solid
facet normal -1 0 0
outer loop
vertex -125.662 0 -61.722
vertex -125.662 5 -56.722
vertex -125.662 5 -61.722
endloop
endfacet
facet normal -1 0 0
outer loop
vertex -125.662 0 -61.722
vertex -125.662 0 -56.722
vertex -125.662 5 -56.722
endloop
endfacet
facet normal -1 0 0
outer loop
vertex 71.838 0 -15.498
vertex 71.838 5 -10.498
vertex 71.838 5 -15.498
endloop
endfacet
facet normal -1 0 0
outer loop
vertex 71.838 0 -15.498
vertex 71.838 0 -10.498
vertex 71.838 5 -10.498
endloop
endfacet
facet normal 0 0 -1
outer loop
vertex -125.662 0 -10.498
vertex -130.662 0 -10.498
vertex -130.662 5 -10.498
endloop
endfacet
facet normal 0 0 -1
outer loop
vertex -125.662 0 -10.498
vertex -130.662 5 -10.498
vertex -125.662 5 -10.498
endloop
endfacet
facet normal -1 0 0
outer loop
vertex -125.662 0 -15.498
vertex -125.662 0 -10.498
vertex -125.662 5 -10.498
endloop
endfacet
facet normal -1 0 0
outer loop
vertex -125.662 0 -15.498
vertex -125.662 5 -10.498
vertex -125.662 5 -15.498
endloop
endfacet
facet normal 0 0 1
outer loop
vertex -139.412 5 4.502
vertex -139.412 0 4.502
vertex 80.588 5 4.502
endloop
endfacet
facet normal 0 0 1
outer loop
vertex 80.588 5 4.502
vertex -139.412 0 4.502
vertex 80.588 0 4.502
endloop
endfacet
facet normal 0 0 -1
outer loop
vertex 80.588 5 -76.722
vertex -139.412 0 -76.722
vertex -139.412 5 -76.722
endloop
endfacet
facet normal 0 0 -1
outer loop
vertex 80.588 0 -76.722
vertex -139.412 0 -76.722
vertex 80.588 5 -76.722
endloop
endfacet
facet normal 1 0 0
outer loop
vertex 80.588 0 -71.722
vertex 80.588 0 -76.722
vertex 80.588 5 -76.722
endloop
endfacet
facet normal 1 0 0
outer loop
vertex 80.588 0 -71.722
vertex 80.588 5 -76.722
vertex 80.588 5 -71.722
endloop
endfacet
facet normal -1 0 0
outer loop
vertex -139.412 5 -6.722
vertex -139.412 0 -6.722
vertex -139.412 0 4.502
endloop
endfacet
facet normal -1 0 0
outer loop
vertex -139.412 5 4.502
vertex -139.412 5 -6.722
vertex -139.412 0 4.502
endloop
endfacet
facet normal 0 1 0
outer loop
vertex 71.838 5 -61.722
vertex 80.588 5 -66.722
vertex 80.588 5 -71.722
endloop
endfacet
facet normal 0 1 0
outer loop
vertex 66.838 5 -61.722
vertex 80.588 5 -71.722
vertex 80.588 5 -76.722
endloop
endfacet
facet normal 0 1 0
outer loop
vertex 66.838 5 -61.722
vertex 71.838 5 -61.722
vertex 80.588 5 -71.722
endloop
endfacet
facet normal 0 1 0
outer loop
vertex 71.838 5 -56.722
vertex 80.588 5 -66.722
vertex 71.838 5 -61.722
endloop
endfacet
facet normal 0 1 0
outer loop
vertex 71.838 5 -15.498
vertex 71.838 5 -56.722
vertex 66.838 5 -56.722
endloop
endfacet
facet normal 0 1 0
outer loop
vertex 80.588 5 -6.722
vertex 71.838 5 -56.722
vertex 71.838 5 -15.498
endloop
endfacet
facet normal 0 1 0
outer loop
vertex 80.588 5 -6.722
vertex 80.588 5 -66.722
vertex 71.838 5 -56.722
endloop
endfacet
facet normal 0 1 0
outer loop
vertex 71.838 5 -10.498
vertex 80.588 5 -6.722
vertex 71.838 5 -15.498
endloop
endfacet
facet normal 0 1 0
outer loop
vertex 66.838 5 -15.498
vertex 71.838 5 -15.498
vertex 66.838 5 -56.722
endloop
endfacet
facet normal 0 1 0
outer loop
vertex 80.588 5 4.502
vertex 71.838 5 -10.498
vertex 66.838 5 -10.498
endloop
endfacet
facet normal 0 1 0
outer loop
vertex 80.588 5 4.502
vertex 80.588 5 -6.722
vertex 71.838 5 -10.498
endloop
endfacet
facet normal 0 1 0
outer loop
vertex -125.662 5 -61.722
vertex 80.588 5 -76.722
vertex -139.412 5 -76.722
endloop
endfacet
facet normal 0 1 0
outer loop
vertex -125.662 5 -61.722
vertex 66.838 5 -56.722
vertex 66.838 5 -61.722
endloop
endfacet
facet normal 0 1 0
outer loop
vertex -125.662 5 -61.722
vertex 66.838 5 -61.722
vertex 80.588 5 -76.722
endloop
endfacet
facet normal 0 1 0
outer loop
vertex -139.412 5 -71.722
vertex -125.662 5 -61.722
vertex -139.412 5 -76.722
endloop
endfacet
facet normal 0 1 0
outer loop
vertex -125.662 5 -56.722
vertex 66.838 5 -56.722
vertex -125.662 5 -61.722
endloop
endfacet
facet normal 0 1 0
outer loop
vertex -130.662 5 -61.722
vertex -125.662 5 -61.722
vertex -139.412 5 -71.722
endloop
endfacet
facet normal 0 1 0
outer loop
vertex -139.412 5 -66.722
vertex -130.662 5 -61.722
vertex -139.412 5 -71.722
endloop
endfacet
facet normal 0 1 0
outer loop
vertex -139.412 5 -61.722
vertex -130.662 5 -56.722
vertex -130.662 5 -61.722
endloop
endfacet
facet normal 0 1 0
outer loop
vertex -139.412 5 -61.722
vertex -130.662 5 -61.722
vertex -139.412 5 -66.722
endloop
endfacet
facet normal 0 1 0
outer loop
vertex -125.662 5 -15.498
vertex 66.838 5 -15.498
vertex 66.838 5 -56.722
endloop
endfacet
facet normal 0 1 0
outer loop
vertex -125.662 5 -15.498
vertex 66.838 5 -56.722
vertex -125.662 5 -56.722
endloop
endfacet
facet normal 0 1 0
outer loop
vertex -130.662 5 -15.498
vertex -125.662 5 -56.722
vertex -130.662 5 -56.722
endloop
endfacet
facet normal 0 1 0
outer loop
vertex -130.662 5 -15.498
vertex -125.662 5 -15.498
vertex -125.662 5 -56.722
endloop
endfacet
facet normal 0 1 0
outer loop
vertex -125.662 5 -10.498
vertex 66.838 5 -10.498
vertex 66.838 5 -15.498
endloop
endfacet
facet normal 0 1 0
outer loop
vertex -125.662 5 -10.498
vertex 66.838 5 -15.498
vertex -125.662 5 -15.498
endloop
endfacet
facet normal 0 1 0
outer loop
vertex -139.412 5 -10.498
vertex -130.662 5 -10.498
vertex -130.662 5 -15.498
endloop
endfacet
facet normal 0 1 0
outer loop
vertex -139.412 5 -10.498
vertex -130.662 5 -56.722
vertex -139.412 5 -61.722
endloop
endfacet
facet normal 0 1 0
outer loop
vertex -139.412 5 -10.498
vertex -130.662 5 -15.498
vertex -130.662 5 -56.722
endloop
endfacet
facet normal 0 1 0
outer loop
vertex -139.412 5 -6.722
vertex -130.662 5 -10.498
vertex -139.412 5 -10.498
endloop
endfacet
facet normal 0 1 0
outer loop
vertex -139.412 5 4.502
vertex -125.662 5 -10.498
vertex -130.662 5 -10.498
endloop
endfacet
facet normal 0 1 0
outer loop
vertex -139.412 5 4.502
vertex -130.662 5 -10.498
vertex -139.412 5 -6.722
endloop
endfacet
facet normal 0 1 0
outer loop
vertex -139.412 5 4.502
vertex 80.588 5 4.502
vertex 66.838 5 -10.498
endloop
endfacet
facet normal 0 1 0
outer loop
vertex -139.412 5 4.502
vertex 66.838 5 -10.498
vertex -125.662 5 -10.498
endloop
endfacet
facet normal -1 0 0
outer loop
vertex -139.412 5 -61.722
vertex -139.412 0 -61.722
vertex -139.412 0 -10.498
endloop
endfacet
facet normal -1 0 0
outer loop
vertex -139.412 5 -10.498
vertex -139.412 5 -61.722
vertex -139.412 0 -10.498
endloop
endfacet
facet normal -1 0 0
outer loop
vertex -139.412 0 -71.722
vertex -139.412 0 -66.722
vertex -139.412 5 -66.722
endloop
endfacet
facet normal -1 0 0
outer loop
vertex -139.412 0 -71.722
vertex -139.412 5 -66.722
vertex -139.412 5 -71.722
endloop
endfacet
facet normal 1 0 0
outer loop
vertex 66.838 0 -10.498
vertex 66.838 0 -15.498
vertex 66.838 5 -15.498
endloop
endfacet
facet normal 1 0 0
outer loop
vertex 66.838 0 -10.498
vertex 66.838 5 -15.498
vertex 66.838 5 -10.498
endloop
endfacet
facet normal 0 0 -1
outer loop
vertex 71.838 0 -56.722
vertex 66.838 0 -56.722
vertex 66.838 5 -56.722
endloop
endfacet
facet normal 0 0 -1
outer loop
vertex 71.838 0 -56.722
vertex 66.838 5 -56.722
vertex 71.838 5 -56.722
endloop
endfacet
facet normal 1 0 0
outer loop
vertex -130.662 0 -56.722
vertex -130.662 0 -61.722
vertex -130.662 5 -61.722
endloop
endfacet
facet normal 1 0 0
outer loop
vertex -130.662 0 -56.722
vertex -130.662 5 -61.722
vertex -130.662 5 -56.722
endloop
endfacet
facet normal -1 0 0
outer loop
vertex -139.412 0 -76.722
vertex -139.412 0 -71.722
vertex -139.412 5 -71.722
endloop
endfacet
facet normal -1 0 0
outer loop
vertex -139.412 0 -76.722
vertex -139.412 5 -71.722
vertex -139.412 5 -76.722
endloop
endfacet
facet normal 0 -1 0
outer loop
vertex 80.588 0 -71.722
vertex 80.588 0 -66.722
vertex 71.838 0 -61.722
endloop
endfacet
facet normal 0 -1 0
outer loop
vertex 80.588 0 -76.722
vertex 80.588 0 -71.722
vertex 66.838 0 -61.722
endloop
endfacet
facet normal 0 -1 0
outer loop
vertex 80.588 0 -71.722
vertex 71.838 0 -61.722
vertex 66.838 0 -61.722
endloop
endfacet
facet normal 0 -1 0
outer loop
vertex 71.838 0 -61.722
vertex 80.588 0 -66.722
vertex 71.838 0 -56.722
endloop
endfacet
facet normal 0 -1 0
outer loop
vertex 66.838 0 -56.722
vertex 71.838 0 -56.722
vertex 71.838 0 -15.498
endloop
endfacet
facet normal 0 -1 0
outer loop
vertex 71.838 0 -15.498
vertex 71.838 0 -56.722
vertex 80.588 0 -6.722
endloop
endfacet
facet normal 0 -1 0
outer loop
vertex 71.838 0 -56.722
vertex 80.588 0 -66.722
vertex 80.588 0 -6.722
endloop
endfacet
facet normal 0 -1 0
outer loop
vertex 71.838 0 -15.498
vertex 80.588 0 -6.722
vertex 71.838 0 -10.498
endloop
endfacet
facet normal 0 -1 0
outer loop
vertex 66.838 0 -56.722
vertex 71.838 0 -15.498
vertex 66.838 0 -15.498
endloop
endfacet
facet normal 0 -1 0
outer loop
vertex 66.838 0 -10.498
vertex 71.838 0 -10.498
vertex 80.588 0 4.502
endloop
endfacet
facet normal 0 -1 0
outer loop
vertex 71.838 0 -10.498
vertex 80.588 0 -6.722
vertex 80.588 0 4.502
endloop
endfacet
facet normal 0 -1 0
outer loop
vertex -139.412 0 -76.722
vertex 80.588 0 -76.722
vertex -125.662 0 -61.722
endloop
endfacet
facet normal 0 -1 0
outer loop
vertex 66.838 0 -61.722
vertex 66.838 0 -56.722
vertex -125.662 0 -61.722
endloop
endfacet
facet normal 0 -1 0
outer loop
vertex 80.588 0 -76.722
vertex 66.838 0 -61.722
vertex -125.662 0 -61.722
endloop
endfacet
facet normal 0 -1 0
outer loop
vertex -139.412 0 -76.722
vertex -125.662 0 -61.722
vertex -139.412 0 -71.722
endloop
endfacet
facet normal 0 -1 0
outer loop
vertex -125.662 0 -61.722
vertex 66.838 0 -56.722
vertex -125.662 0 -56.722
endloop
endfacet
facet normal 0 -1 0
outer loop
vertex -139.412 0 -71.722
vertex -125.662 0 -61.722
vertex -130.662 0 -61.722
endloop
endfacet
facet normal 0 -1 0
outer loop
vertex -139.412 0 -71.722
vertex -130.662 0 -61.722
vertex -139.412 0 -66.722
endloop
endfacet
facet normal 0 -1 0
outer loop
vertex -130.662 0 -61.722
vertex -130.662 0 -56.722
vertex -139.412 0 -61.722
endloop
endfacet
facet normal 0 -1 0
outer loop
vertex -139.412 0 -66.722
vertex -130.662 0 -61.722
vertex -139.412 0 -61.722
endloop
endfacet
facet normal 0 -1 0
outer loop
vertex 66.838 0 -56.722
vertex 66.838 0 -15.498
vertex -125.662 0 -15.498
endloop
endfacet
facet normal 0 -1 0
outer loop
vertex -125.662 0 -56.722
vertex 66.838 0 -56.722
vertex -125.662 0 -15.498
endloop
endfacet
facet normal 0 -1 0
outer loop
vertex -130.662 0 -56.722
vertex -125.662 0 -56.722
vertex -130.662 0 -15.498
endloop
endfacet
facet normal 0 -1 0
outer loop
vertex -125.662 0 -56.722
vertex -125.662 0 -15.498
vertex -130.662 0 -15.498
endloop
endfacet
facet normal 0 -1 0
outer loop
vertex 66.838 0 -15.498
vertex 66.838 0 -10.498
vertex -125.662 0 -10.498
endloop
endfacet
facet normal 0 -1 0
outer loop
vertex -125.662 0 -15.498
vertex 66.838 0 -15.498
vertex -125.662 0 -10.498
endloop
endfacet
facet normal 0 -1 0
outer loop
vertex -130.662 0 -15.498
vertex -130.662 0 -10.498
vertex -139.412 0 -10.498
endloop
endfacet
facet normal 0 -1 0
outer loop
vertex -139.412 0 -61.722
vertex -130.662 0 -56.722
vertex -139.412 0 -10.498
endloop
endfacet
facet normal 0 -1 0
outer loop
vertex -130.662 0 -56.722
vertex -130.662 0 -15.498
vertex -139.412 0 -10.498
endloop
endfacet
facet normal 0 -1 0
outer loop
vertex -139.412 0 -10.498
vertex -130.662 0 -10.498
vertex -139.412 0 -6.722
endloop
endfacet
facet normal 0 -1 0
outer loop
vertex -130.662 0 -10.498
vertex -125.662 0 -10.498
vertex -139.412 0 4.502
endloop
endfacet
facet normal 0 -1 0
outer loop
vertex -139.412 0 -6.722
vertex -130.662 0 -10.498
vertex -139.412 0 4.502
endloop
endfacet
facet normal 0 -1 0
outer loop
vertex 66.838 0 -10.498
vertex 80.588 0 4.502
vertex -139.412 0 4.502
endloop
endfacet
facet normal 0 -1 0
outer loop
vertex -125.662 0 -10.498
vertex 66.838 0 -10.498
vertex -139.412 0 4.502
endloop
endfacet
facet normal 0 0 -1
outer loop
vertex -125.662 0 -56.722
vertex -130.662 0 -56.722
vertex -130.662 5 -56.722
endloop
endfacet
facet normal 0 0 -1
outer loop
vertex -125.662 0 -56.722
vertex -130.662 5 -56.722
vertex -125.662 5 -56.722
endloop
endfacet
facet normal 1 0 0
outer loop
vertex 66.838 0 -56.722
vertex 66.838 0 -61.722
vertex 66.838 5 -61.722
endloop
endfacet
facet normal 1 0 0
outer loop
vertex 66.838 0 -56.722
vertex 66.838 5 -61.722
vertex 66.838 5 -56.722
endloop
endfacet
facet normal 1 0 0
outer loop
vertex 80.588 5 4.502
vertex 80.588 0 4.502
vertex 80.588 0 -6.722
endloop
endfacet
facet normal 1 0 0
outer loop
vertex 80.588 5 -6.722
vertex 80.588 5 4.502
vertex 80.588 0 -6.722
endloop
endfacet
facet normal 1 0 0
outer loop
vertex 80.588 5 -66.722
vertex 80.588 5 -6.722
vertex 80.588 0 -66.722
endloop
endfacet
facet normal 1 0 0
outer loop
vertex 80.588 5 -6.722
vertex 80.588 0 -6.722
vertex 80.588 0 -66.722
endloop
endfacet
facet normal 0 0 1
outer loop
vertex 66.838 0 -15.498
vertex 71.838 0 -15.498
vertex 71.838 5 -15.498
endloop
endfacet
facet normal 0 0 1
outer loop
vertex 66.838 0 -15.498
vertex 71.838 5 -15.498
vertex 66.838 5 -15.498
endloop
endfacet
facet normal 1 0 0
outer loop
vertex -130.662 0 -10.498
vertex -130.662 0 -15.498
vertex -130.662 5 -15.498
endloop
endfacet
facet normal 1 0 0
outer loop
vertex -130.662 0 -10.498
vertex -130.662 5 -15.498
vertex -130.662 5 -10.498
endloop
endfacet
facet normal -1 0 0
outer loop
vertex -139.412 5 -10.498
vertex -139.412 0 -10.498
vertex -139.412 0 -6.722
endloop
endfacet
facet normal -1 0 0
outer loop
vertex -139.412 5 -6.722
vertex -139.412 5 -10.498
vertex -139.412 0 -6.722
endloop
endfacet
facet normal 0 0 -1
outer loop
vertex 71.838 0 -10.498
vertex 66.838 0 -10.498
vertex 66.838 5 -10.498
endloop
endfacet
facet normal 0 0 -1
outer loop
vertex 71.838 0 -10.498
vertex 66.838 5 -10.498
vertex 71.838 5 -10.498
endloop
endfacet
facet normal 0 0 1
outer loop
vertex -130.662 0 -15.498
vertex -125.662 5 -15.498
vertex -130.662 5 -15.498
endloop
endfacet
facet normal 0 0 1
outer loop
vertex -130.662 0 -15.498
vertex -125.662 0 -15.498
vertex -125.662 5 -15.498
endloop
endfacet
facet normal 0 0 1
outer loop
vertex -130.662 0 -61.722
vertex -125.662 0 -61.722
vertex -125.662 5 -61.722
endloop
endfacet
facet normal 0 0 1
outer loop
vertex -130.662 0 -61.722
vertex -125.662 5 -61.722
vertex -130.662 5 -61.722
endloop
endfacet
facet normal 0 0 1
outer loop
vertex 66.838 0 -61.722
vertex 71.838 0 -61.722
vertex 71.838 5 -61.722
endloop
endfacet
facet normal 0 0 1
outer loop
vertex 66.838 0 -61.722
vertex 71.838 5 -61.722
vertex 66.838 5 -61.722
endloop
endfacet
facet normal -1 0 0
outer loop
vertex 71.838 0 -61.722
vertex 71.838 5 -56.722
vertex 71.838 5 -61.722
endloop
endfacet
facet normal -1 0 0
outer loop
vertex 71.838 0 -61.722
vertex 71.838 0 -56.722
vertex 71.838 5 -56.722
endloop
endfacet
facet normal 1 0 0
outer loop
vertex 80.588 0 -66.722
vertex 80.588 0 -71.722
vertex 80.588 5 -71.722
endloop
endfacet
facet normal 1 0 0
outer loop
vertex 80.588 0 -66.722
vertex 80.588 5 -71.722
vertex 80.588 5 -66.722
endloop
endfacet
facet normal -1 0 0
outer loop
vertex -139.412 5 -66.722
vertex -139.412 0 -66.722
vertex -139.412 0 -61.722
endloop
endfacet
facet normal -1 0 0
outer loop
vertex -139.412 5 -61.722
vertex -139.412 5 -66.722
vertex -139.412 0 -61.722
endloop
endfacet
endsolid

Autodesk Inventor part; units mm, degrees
ref_plane "YZ Plane" through (0, 0, 0) normal (1, 0, 0) x (0, 1, 0)
ref_plane "XZ Plane" through (0, 0, 0) normal (0, 1, 0) x (-1, 0, 0)
ref_plane "XY Plane" through (0, 0, 0) normal (0, 0, 1) x (1, 0, 0)
sketch "Sketch1" plane through (0, 0, 0) normal (0, 1, 0) x (-1, 0, 0)
  line L0 (139.4119, -66.7225) -> (139.4119, -6.7225)
  line L1 (-80.5881, -6.7225) -> (-80.5881, -66.7225)
  line L2 (130.6619, -61.7225) -> (130.6619, -56.7225)
  line L3 (130.6619, -56.7225) -> (125.6619, -56.7225)
  line L4 (125.6619, -56.7225) -> (125.6619, -61.7225)
  line L5 (125.6619, -61.7225) -> (130.6619, -61.7225)
  line L6 (130.6619, -15.4975) -> (130.6619, -10.4975)
  line L7 (130.6619, -10.4975) -> (125.6619, -10.4975)
  line L8 (125.6619, -10.4975) -> (125.6619, -15.4975)
  line L9 (125.6619, -15.4975) -> (130.6619, -15.4975)
  line L10 (-71.8381, -61.7225) -> (-66.8381, -61.7225)
  line L11 (-66.8381, -61.7225) -> (-66.8381, -56.7225)
  line L12 (-66.8381, -56.7225) -> (-71.8381, -56.7225)
  line L13 (-71.8381, -56.7225) -> (-71.8381, -61.7225)
  line L14 (-71.8381, -15.4975) -> (-66.8381, -15.4975)
  line L15 (-66.8381, -15.4975) -> (-66.8381, -10.4975)
  line L16 (-66.8381, -10.4975) -> (-71.8381, -10.4975)
  line L17 (-71.8381, -10.4975) -> (-71.8381, -15.4975)
  line L18 (139.4119, -66.7225) -> (139.4119, -71.7225)
  line L19 (-80.5881, -71.7225) -> (-80.5881, -66.7225)
  line L20 (139.4119, -61.7225) -> (139.4119, -76.7225)
  line L21 (-80.5881, -76.7225) -> (-80.5881, -71.7225)
  line L22 (139.4119, -10.4975) -> (139.4119, 4.5025)
  line L23 (-80.5881, 4.5025) -> (-80.5881, -6.7225)
  line L24 (139.4119, -76.7225) -> (-80.5881, -76.7225)
  line L25 (139.4119, 4.5025) -> (-80.5881, 4.5025)
  point P0 (0, 0)
  dimension "d0" = 60
  dimension "d2" = 5
  dimension "d3" = 5
  dimension "d4" = 5
  dimension "d5" = 41.225
  dimension "d7" = 5
  dimension "d8" = 5
  dimension "d9" = 192.5
  dimension "d10" = 8.75
  dimension "d13" = 5
extrude "Extrusion1" add sketch "Sketch1" along normal blind 5
properties part number "Part Atap"
